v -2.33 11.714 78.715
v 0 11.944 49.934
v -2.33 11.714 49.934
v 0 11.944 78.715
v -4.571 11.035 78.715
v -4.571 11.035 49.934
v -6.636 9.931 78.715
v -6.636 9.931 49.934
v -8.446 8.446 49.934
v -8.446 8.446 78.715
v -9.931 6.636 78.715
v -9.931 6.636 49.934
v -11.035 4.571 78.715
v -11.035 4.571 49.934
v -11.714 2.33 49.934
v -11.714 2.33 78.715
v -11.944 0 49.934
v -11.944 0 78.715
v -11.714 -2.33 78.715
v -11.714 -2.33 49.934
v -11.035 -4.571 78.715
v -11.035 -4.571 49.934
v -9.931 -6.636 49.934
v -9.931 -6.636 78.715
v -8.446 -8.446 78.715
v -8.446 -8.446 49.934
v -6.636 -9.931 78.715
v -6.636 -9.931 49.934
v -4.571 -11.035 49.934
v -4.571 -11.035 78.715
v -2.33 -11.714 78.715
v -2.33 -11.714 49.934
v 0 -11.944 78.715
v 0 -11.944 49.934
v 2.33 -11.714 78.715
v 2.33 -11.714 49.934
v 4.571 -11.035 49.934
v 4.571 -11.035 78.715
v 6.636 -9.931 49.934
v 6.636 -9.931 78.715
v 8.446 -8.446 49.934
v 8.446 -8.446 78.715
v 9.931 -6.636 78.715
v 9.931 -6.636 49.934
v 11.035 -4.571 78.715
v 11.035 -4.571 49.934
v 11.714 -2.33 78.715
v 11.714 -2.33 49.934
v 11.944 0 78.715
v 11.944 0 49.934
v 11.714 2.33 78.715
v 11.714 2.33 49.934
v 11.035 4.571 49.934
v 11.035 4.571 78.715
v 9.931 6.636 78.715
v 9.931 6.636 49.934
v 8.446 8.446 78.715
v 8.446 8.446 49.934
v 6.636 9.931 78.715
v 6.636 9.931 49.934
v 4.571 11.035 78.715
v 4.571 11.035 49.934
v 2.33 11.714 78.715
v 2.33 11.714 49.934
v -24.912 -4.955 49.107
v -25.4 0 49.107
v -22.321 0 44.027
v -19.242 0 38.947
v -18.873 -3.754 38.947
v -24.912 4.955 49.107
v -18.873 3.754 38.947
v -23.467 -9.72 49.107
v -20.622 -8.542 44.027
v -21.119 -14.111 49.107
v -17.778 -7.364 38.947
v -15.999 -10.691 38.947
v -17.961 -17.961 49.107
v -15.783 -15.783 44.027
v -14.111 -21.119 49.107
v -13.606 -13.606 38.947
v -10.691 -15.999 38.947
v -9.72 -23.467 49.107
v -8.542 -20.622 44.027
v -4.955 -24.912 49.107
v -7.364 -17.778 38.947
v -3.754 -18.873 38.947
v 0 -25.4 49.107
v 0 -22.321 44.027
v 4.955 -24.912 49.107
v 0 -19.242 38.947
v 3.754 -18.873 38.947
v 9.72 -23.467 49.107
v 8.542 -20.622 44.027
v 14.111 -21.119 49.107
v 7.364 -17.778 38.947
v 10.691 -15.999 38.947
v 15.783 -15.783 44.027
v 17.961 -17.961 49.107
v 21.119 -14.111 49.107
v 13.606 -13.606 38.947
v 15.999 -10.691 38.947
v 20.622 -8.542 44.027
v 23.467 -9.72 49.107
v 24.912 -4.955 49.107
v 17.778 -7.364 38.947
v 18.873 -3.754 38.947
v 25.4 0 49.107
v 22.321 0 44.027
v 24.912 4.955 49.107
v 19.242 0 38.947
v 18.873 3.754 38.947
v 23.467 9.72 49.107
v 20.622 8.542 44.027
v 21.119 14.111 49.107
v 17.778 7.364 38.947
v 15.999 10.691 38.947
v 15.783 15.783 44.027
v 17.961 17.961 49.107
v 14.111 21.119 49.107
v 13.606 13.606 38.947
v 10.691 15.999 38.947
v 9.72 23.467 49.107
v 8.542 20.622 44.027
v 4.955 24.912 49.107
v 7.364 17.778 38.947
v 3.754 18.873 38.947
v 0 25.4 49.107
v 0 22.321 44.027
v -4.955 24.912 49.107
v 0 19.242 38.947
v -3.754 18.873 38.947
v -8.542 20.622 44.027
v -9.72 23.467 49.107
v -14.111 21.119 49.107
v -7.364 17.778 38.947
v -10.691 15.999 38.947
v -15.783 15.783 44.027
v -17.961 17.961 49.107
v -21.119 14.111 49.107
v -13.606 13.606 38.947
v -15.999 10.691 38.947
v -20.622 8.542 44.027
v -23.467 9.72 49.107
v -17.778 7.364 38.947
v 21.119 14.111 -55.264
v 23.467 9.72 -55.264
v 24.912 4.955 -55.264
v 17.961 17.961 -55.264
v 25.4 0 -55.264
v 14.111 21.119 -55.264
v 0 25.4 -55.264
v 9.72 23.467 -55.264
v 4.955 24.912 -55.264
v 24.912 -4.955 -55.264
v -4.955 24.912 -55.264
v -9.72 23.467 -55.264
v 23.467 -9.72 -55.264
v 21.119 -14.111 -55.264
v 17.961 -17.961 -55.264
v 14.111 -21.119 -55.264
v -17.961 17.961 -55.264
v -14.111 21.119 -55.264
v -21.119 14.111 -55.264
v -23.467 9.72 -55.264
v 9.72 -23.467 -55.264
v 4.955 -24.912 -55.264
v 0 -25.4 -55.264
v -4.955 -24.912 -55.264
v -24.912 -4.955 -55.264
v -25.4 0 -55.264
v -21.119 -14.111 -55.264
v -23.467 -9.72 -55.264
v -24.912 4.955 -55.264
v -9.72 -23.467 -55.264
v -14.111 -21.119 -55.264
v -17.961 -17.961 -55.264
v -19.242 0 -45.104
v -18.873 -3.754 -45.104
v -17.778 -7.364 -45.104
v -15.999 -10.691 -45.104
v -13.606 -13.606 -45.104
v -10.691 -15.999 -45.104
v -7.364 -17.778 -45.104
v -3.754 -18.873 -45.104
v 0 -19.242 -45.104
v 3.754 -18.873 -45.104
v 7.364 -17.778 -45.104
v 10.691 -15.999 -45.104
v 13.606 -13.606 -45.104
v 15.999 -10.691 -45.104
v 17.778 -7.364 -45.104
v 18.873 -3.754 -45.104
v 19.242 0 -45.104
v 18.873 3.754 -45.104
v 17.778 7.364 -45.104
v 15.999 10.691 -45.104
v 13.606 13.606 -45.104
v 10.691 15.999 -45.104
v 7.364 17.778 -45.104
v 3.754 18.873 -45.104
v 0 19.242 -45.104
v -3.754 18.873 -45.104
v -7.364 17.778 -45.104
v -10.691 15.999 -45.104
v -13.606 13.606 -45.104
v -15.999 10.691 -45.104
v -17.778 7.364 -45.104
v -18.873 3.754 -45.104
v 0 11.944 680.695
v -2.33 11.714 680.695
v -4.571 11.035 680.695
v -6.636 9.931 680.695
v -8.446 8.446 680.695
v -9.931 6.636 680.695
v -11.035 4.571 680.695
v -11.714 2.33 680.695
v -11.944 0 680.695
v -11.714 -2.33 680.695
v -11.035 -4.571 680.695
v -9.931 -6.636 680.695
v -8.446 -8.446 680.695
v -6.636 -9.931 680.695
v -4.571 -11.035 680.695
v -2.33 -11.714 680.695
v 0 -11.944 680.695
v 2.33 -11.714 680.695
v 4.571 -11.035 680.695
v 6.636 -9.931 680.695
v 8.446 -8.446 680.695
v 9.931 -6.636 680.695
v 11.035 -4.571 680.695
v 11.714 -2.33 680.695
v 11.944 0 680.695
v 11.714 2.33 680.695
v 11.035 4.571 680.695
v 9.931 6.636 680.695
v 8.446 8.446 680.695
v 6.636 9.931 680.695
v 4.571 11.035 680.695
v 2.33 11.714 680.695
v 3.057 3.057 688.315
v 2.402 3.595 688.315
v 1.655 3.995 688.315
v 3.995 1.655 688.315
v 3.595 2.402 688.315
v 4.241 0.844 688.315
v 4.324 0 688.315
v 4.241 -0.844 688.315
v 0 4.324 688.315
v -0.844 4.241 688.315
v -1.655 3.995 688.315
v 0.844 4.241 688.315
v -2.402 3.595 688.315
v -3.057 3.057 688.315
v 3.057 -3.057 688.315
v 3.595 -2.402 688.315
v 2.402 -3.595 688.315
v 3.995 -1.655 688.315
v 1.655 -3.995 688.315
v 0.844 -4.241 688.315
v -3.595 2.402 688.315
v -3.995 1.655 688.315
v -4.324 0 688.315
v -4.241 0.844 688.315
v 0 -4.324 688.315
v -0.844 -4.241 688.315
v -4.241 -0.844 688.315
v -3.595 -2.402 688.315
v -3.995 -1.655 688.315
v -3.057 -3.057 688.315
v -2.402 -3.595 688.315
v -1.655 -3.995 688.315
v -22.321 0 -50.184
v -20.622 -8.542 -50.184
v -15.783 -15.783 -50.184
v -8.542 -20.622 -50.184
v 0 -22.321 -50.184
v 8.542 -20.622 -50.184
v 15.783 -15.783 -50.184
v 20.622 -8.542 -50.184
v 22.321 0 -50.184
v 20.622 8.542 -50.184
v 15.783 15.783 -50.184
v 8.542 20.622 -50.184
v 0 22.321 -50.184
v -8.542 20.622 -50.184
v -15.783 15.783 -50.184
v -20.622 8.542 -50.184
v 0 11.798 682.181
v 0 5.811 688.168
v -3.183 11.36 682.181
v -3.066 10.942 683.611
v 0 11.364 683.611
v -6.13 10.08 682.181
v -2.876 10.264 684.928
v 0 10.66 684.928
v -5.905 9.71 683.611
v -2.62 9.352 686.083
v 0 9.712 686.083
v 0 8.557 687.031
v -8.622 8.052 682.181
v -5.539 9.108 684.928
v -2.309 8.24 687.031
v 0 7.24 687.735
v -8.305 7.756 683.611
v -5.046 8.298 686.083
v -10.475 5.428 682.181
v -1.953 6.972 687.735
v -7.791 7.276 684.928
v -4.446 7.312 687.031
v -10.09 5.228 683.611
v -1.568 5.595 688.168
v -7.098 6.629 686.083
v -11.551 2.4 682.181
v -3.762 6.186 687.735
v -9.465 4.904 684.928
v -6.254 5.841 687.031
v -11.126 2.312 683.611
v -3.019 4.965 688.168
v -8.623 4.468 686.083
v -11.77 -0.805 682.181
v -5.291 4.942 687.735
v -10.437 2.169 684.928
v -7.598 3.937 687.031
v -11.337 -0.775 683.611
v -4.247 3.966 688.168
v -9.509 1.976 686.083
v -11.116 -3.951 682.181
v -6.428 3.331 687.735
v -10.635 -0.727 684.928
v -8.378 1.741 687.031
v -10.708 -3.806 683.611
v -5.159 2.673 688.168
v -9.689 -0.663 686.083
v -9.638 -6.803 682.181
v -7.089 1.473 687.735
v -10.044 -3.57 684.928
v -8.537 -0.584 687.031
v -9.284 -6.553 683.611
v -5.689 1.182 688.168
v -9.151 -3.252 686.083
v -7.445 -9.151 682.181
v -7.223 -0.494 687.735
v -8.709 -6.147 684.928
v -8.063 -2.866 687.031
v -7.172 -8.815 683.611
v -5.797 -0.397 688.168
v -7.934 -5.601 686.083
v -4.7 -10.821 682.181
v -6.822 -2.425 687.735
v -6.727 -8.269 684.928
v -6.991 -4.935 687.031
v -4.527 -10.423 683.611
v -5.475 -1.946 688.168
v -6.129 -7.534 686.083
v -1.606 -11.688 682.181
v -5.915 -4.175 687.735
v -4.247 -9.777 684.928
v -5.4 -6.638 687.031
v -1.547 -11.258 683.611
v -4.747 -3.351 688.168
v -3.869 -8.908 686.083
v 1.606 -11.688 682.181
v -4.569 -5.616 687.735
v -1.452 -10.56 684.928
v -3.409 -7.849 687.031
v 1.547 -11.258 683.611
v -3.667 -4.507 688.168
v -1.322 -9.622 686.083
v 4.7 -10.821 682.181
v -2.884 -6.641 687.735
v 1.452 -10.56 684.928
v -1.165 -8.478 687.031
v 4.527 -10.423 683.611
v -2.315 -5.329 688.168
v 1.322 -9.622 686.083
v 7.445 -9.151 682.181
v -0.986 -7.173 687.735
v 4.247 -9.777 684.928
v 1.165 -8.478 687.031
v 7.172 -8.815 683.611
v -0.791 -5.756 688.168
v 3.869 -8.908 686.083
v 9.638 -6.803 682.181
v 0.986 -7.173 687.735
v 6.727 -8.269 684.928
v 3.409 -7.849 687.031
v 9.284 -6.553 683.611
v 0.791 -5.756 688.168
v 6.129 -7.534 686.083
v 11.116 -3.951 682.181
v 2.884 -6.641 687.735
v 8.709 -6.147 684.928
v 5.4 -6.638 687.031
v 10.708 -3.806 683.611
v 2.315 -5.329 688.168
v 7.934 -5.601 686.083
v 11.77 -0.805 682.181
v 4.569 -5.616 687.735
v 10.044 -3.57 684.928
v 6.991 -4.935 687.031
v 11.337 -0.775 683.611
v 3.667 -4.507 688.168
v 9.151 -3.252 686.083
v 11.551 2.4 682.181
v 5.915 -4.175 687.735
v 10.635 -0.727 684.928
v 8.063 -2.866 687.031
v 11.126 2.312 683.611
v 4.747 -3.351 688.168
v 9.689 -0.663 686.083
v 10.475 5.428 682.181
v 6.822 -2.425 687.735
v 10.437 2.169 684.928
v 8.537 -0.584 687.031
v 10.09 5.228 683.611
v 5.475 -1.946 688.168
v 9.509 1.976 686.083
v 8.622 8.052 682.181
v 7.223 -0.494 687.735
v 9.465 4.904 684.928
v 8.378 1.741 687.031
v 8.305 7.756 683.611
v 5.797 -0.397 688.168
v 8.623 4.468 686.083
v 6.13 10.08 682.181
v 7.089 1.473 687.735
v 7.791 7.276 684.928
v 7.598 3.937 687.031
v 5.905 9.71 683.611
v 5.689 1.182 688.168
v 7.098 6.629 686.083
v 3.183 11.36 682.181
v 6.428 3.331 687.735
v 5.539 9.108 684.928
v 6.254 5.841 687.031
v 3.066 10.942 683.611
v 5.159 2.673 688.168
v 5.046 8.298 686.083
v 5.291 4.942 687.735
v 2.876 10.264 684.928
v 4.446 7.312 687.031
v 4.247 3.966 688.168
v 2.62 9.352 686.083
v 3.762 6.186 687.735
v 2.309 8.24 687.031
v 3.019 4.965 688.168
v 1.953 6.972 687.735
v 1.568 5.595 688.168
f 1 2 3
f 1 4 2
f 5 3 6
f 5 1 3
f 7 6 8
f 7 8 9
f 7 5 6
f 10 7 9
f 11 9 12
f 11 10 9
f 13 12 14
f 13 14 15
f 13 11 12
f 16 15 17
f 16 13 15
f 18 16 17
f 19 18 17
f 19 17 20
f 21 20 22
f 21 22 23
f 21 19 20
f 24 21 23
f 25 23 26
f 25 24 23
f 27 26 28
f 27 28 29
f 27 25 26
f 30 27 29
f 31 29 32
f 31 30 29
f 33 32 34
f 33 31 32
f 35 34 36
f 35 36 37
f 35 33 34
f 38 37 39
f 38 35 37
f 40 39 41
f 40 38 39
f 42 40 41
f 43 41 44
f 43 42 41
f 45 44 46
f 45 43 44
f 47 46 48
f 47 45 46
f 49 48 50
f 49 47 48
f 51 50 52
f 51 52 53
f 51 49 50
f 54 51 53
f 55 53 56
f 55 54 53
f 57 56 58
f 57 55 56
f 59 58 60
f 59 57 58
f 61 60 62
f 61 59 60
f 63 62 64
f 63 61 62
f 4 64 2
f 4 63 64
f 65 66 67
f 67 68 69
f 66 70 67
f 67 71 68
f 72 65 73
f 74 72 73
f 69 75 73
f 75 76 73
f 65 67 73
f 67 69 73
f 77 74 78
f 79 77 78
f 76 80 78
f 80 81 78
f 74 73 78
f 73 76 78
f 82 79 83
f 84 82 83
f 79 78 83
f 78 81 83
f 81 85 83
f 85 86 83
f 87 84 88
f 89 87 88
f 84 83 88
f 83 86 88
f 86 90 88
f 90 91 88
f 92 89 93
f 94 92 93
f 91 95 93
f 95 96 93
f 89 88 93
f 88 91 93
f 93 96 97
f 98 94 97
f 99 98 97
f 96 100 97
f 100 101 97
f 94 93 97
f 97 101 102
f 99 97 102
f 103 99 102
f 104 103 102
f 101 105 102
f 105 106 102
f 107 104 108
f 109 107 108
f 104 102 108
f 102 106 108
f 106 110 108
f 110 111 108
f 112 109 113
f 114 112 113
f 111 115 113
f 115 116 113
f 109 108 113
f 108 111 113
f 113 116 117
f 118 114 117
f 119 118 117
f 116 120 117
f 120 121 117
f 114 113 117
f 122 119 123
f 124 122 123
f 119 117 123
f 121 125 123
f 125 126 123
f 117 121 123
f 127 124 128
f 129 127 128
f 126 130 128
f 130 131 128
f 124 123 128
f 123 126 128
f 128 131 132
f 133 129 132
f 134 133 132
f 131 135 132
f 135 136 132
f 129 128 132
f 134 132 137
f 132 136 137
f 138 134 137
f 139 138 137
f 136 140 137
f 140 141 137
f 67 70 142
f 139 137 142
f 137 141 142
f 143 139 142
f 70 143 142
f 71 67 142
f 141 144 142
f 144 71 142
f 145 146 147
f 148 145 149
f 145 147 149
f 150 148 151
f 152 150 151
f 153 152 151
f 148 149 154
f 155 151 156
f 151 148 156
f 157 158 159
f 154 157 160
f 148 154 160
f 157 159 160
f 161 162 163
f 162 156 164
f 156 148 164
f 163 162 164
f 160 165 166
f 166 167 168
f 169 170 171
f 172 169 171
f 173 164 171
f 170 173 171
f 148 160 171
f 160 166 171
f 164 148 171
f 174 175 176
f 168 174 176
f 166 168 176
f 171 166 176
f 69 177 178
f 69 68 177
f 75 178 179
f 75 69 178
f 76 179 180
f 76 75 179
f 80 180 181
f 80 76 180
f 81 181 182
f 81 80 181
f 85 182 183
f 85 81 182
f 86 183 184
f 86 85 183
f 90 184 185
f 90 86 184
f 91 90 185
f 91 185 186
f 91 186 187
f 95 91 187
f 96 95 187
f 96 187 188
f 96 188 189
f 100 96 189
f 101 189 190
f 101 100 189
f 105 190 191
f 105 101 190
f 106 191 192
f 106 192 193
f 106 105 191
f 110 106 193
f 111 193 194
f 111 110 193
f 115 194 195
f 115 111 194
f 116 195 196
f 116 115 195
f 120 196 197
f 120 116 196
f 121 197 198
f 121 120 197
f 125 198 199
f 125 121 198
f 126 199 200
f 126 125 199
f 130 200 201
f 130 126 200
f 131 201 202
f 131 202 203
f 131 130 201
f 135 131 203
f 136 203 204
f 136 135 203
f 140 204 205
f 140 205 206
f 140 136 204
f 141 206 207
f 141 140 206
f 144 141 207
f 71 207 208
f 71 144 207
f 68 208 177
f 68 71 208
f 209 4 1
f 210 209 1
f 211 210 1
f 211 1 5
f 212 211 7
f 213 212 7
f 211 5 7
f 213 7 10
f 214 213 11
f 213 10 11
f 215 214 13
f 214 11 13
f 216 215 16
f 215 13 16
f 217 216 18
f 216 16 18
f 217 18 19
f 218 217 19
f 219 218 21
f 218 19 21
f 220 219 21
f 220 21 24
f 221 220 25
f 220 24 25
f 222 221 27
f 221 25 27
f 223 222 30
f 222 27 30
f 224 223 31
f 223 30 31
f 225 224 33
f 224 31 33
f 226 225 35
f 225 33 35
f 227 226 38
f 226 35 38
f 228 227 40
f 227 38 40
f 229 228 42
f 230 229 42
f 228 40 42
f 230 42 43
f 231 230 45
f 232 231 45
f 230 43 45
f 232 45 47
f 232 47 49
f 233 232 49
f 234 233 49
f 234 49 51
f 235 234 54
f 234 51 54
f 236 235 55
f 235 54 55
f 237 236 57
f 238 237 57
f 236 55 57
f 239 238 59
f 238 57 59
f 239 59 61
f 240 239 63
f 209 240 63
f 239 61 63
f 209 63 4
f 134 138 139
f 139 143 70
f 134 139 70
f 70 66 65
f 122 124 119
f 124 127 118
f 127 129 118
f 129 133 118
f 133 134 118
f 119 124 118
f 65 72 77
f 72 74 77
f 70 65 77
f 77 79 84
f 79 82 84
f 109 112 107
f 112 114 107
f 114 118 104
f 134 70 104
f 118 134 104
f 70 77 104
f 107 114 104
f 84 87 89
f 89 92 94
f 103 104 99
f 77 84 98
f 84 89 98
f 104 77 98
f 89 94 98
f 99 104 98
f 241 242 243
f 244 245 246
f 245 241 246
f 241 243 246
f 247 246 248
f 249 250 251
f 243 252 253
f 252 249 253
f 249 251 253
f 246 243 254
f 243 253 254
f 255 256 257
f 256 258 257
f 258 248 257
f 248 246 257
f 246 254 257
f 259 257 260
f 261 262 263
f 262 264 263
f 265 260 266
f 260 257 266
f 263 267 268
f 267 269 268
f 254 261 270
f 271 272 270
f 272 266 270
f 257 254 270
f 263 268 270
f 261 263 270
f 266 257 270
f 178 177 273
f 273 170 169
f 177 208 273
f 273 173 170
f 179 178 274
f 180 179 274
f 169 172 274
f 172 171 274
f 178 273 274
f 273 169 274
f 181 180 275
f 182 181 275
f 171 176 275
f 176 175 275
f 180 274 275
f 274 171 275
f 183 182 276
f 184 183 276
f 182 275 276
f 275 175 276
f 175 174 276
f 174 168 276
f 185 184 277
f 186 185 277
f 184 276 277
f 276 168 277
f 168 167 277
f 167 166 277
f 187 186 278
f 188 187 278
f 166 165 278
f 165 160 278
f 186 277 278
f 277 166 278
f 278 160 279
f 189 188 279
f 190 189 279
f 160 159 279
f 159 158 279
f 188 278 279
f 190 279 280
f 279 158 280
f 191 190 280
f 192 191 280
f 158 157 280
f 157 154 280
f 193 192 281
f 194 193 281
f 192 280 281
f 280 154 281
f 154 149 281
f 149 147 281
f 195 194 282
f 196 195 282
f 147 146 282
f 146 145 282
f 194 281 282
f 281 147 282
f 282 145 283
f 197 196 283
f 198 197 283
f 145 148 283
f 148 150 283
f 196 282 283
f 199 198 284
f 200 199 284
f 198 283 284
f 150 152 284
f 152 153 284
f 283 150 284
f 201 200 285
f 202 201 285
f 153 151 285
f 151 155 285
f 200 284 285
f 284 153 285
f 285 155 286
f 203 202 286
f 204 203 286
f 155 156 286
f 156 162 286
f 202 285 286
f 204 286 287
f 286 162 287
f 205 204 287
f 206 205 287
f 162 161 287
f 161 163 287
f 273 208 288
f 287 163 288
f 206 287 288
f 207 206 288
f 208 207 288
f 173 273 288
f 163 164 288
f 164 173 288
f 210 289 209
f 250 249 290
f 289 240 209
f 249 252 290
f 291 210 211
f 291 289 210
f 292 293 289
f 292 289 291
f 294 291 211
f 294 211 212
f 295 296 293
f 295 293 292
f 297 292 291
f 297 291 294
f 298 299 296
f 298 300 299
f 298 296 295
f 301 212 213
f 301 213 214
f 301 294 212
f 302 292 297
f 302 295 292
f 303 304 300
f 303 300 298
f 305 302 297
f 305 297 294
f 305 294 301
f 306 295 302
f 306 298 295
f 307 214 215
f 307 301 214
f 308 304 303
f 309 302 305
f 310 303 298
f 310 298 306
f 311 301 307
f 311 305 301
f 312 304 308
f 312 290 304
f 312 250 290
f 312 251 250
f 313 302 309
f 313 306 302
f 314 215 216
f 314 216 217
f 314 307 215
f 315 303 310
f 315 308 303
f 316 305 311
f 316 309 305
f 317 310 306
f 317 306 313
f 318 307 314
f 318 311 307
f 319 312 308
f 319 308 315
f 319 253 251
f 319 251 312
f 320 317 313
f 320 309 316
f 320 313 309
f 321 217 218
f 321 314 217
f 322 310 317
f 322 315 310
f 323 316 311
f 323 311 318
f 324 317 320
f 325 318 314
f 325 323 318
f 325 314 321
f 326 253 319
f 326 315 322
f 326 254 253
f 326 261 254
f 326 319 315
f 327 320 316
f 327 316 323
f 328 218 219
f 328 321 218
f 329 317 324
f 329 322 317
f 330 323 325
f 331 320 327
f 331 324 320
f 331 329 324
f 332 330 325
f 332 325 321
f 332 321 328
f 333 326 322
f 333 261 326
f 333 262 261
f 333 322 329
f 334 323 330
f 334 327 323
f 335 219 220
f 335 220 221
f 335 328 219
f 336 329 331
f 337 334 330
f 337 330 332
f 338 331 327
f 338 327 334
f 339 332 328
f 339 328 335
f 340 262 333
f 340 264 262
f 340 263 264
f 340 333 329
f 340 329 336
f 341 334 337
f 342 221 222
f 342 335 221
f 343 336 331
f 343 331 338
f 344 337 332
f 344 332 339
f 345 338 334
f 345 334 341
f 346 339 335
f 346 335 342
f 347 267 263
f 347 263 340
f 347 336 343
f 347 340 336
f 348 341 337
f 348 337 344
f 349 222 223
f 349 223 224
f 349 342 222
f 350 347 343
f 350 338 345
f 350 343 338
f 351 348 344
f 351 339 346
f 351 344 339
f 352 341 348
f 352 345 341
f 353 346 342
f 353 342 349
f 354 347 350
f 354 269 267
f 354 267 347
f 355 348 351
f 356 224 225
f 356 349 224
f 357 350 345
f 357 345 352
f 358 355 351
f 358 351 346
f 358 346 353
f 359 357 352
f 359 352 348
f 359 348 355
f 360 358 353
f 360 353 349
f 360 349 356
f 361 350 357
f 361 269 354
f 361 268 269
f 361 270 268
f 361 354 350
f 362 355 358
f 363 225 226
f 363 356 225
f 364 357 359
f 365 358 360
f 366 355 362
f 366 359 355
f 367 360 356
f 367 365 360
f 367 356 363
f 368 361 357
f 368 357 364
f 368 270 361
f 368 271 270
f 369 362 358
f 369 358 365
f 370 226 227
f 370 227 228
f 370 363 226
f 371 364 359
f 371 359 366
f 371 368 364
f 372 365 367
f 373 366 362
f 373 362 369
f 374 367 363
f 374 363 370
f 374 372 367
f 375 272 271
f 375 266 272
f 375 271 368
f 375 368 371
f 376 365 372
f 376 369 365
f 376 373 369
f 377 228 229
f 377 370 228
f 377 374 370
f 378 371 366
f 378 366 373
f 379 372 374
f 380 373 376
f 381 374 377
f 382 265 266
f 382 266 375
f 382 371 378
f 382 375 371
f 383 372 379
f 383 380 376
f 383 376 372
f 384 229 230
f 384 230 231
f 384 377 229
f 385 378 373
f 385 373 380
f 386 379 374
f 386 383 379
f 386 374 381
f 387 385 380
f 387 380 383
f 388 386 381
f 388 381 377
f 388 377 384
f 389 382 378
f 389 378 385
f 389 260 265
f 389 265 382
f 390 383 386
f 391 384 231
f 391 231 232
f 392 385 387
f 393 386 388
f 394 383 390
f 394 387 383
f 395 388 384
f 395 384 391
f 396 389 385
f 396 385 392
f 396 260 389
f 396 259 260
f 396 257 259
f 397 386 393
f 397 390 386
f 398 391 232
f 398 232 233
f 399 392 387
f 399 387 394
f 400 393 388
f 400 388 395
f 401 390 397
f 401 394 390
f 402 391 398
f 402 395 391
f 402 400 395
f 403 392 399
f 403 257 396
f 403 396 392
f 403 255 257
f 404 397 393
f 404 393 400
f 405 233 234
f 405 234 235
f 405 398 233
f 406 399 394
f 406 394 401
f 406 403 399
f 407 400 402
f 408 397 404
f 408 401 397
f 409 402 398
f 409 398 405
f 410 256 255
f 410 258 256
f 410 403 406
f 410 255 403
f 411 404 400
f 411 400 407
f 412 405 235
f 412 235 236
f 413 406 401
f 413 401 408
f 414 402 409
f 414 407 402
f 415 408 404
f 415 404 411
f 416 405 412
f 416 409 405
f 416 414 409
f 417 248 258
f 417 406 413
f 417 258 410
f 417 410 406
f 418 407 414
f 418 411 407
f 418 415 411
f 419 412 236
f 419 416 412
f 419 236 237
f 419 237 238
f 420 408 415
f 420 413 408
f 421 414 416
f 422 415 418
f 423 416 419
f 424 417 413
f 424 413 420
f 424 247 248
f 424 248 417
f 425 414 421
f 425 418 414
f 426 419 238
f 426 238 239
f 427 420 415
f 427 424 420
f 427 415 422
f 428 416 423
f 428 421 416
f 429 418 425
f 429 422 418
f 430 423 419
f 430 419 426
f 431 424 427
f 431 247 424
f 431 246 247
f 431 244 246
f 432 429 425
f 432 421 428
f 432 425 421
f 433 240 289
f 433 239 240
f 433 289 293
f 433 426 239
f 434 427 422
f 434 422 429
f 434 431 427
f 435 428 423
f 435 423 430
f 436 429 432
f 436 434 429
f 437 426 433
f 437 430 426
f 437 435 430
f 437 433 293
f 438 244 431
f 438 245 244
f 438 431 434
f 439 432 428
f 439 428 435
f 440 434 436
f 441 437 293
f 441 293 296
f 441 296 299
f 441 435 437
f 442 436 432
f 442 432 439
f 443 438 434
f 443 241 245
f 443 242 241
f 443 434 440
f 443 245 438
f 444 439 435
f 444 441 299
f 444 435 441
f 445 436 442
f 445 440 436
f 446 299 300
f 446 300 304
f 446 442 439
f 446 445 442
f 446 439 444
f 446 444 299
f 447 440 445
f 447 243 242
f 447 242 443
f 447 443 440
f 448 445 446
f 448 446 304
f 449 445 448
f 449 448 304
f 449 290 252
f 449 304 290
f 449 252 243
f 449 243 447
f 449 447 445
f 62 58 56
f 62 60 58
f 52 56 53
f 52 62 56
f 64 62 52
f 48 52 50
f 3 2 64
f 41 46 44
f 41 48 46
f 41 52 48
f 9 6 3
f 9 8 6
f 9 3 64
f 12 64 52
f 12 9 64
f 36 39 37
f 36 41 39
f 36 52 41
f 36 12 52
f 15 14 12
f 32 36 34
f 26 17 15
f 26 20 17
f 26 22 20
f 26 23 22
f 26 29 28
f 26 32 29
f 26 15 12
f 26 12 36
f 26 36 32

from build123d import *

# Parameters (mm, degrees)
F0_W     = 19.2424261712
F0_H     = 84.0509093954
F2_W     = 11.9439382106
F2_H     = 28.7805683911
F4_DEPTH = 609.6
F5_R     = 7.62


with BuildPart() as f1:
    # F0 (on Front) → F1 (revolve)
    with BuildSketch(Plane.XZ):
        Polygon((-19.2424261712, 38.9466661084), (0, 38.9466661084), (0, 49.1066661084), (-25.4, 49.1066661084), align=None)
        Polygon((0, -55.2642432871), (0, -45.1042432871), (-19.2424261712, -45.1042432871), (-25.4, -55.2642432871), align=None)
        with Locations((-9.6212130856, -3.0787885894)):
            Rectangle(F0_W, F0_H)
    revolve(axis=Axis((0, 0, -50.1842432871), (0, 0, 1)))


with BuildPart() as f3:
    # F2 (on Right) → F3 (revolve)
    with BuildSketch(Plane.YZ):
        with Locations((5.9719691053, 64.3245857209)):
            Rectangle(F2_W, F2_H)
    revolve(axis=Axis((0, 0, 64.3245857209), (0, 0, 1)))

    # F4 (add): a face of the model
    f4_faces = [f3.faces().sort_by_distance(p)[0] for p in [
        (0, 0, 78.7148699164),
    ]]
    extrude(f4_faces, amount=F4_DEPTH)

    # F5
    f5_edges = [f3.edges().sort_by_distance(p)[0] for p in [
        (0, -11.943938, 688.31487),
    ]]
    fillet(f5_edges, radius=F5_R)


solid = Compound([f1.part, f3.part])
